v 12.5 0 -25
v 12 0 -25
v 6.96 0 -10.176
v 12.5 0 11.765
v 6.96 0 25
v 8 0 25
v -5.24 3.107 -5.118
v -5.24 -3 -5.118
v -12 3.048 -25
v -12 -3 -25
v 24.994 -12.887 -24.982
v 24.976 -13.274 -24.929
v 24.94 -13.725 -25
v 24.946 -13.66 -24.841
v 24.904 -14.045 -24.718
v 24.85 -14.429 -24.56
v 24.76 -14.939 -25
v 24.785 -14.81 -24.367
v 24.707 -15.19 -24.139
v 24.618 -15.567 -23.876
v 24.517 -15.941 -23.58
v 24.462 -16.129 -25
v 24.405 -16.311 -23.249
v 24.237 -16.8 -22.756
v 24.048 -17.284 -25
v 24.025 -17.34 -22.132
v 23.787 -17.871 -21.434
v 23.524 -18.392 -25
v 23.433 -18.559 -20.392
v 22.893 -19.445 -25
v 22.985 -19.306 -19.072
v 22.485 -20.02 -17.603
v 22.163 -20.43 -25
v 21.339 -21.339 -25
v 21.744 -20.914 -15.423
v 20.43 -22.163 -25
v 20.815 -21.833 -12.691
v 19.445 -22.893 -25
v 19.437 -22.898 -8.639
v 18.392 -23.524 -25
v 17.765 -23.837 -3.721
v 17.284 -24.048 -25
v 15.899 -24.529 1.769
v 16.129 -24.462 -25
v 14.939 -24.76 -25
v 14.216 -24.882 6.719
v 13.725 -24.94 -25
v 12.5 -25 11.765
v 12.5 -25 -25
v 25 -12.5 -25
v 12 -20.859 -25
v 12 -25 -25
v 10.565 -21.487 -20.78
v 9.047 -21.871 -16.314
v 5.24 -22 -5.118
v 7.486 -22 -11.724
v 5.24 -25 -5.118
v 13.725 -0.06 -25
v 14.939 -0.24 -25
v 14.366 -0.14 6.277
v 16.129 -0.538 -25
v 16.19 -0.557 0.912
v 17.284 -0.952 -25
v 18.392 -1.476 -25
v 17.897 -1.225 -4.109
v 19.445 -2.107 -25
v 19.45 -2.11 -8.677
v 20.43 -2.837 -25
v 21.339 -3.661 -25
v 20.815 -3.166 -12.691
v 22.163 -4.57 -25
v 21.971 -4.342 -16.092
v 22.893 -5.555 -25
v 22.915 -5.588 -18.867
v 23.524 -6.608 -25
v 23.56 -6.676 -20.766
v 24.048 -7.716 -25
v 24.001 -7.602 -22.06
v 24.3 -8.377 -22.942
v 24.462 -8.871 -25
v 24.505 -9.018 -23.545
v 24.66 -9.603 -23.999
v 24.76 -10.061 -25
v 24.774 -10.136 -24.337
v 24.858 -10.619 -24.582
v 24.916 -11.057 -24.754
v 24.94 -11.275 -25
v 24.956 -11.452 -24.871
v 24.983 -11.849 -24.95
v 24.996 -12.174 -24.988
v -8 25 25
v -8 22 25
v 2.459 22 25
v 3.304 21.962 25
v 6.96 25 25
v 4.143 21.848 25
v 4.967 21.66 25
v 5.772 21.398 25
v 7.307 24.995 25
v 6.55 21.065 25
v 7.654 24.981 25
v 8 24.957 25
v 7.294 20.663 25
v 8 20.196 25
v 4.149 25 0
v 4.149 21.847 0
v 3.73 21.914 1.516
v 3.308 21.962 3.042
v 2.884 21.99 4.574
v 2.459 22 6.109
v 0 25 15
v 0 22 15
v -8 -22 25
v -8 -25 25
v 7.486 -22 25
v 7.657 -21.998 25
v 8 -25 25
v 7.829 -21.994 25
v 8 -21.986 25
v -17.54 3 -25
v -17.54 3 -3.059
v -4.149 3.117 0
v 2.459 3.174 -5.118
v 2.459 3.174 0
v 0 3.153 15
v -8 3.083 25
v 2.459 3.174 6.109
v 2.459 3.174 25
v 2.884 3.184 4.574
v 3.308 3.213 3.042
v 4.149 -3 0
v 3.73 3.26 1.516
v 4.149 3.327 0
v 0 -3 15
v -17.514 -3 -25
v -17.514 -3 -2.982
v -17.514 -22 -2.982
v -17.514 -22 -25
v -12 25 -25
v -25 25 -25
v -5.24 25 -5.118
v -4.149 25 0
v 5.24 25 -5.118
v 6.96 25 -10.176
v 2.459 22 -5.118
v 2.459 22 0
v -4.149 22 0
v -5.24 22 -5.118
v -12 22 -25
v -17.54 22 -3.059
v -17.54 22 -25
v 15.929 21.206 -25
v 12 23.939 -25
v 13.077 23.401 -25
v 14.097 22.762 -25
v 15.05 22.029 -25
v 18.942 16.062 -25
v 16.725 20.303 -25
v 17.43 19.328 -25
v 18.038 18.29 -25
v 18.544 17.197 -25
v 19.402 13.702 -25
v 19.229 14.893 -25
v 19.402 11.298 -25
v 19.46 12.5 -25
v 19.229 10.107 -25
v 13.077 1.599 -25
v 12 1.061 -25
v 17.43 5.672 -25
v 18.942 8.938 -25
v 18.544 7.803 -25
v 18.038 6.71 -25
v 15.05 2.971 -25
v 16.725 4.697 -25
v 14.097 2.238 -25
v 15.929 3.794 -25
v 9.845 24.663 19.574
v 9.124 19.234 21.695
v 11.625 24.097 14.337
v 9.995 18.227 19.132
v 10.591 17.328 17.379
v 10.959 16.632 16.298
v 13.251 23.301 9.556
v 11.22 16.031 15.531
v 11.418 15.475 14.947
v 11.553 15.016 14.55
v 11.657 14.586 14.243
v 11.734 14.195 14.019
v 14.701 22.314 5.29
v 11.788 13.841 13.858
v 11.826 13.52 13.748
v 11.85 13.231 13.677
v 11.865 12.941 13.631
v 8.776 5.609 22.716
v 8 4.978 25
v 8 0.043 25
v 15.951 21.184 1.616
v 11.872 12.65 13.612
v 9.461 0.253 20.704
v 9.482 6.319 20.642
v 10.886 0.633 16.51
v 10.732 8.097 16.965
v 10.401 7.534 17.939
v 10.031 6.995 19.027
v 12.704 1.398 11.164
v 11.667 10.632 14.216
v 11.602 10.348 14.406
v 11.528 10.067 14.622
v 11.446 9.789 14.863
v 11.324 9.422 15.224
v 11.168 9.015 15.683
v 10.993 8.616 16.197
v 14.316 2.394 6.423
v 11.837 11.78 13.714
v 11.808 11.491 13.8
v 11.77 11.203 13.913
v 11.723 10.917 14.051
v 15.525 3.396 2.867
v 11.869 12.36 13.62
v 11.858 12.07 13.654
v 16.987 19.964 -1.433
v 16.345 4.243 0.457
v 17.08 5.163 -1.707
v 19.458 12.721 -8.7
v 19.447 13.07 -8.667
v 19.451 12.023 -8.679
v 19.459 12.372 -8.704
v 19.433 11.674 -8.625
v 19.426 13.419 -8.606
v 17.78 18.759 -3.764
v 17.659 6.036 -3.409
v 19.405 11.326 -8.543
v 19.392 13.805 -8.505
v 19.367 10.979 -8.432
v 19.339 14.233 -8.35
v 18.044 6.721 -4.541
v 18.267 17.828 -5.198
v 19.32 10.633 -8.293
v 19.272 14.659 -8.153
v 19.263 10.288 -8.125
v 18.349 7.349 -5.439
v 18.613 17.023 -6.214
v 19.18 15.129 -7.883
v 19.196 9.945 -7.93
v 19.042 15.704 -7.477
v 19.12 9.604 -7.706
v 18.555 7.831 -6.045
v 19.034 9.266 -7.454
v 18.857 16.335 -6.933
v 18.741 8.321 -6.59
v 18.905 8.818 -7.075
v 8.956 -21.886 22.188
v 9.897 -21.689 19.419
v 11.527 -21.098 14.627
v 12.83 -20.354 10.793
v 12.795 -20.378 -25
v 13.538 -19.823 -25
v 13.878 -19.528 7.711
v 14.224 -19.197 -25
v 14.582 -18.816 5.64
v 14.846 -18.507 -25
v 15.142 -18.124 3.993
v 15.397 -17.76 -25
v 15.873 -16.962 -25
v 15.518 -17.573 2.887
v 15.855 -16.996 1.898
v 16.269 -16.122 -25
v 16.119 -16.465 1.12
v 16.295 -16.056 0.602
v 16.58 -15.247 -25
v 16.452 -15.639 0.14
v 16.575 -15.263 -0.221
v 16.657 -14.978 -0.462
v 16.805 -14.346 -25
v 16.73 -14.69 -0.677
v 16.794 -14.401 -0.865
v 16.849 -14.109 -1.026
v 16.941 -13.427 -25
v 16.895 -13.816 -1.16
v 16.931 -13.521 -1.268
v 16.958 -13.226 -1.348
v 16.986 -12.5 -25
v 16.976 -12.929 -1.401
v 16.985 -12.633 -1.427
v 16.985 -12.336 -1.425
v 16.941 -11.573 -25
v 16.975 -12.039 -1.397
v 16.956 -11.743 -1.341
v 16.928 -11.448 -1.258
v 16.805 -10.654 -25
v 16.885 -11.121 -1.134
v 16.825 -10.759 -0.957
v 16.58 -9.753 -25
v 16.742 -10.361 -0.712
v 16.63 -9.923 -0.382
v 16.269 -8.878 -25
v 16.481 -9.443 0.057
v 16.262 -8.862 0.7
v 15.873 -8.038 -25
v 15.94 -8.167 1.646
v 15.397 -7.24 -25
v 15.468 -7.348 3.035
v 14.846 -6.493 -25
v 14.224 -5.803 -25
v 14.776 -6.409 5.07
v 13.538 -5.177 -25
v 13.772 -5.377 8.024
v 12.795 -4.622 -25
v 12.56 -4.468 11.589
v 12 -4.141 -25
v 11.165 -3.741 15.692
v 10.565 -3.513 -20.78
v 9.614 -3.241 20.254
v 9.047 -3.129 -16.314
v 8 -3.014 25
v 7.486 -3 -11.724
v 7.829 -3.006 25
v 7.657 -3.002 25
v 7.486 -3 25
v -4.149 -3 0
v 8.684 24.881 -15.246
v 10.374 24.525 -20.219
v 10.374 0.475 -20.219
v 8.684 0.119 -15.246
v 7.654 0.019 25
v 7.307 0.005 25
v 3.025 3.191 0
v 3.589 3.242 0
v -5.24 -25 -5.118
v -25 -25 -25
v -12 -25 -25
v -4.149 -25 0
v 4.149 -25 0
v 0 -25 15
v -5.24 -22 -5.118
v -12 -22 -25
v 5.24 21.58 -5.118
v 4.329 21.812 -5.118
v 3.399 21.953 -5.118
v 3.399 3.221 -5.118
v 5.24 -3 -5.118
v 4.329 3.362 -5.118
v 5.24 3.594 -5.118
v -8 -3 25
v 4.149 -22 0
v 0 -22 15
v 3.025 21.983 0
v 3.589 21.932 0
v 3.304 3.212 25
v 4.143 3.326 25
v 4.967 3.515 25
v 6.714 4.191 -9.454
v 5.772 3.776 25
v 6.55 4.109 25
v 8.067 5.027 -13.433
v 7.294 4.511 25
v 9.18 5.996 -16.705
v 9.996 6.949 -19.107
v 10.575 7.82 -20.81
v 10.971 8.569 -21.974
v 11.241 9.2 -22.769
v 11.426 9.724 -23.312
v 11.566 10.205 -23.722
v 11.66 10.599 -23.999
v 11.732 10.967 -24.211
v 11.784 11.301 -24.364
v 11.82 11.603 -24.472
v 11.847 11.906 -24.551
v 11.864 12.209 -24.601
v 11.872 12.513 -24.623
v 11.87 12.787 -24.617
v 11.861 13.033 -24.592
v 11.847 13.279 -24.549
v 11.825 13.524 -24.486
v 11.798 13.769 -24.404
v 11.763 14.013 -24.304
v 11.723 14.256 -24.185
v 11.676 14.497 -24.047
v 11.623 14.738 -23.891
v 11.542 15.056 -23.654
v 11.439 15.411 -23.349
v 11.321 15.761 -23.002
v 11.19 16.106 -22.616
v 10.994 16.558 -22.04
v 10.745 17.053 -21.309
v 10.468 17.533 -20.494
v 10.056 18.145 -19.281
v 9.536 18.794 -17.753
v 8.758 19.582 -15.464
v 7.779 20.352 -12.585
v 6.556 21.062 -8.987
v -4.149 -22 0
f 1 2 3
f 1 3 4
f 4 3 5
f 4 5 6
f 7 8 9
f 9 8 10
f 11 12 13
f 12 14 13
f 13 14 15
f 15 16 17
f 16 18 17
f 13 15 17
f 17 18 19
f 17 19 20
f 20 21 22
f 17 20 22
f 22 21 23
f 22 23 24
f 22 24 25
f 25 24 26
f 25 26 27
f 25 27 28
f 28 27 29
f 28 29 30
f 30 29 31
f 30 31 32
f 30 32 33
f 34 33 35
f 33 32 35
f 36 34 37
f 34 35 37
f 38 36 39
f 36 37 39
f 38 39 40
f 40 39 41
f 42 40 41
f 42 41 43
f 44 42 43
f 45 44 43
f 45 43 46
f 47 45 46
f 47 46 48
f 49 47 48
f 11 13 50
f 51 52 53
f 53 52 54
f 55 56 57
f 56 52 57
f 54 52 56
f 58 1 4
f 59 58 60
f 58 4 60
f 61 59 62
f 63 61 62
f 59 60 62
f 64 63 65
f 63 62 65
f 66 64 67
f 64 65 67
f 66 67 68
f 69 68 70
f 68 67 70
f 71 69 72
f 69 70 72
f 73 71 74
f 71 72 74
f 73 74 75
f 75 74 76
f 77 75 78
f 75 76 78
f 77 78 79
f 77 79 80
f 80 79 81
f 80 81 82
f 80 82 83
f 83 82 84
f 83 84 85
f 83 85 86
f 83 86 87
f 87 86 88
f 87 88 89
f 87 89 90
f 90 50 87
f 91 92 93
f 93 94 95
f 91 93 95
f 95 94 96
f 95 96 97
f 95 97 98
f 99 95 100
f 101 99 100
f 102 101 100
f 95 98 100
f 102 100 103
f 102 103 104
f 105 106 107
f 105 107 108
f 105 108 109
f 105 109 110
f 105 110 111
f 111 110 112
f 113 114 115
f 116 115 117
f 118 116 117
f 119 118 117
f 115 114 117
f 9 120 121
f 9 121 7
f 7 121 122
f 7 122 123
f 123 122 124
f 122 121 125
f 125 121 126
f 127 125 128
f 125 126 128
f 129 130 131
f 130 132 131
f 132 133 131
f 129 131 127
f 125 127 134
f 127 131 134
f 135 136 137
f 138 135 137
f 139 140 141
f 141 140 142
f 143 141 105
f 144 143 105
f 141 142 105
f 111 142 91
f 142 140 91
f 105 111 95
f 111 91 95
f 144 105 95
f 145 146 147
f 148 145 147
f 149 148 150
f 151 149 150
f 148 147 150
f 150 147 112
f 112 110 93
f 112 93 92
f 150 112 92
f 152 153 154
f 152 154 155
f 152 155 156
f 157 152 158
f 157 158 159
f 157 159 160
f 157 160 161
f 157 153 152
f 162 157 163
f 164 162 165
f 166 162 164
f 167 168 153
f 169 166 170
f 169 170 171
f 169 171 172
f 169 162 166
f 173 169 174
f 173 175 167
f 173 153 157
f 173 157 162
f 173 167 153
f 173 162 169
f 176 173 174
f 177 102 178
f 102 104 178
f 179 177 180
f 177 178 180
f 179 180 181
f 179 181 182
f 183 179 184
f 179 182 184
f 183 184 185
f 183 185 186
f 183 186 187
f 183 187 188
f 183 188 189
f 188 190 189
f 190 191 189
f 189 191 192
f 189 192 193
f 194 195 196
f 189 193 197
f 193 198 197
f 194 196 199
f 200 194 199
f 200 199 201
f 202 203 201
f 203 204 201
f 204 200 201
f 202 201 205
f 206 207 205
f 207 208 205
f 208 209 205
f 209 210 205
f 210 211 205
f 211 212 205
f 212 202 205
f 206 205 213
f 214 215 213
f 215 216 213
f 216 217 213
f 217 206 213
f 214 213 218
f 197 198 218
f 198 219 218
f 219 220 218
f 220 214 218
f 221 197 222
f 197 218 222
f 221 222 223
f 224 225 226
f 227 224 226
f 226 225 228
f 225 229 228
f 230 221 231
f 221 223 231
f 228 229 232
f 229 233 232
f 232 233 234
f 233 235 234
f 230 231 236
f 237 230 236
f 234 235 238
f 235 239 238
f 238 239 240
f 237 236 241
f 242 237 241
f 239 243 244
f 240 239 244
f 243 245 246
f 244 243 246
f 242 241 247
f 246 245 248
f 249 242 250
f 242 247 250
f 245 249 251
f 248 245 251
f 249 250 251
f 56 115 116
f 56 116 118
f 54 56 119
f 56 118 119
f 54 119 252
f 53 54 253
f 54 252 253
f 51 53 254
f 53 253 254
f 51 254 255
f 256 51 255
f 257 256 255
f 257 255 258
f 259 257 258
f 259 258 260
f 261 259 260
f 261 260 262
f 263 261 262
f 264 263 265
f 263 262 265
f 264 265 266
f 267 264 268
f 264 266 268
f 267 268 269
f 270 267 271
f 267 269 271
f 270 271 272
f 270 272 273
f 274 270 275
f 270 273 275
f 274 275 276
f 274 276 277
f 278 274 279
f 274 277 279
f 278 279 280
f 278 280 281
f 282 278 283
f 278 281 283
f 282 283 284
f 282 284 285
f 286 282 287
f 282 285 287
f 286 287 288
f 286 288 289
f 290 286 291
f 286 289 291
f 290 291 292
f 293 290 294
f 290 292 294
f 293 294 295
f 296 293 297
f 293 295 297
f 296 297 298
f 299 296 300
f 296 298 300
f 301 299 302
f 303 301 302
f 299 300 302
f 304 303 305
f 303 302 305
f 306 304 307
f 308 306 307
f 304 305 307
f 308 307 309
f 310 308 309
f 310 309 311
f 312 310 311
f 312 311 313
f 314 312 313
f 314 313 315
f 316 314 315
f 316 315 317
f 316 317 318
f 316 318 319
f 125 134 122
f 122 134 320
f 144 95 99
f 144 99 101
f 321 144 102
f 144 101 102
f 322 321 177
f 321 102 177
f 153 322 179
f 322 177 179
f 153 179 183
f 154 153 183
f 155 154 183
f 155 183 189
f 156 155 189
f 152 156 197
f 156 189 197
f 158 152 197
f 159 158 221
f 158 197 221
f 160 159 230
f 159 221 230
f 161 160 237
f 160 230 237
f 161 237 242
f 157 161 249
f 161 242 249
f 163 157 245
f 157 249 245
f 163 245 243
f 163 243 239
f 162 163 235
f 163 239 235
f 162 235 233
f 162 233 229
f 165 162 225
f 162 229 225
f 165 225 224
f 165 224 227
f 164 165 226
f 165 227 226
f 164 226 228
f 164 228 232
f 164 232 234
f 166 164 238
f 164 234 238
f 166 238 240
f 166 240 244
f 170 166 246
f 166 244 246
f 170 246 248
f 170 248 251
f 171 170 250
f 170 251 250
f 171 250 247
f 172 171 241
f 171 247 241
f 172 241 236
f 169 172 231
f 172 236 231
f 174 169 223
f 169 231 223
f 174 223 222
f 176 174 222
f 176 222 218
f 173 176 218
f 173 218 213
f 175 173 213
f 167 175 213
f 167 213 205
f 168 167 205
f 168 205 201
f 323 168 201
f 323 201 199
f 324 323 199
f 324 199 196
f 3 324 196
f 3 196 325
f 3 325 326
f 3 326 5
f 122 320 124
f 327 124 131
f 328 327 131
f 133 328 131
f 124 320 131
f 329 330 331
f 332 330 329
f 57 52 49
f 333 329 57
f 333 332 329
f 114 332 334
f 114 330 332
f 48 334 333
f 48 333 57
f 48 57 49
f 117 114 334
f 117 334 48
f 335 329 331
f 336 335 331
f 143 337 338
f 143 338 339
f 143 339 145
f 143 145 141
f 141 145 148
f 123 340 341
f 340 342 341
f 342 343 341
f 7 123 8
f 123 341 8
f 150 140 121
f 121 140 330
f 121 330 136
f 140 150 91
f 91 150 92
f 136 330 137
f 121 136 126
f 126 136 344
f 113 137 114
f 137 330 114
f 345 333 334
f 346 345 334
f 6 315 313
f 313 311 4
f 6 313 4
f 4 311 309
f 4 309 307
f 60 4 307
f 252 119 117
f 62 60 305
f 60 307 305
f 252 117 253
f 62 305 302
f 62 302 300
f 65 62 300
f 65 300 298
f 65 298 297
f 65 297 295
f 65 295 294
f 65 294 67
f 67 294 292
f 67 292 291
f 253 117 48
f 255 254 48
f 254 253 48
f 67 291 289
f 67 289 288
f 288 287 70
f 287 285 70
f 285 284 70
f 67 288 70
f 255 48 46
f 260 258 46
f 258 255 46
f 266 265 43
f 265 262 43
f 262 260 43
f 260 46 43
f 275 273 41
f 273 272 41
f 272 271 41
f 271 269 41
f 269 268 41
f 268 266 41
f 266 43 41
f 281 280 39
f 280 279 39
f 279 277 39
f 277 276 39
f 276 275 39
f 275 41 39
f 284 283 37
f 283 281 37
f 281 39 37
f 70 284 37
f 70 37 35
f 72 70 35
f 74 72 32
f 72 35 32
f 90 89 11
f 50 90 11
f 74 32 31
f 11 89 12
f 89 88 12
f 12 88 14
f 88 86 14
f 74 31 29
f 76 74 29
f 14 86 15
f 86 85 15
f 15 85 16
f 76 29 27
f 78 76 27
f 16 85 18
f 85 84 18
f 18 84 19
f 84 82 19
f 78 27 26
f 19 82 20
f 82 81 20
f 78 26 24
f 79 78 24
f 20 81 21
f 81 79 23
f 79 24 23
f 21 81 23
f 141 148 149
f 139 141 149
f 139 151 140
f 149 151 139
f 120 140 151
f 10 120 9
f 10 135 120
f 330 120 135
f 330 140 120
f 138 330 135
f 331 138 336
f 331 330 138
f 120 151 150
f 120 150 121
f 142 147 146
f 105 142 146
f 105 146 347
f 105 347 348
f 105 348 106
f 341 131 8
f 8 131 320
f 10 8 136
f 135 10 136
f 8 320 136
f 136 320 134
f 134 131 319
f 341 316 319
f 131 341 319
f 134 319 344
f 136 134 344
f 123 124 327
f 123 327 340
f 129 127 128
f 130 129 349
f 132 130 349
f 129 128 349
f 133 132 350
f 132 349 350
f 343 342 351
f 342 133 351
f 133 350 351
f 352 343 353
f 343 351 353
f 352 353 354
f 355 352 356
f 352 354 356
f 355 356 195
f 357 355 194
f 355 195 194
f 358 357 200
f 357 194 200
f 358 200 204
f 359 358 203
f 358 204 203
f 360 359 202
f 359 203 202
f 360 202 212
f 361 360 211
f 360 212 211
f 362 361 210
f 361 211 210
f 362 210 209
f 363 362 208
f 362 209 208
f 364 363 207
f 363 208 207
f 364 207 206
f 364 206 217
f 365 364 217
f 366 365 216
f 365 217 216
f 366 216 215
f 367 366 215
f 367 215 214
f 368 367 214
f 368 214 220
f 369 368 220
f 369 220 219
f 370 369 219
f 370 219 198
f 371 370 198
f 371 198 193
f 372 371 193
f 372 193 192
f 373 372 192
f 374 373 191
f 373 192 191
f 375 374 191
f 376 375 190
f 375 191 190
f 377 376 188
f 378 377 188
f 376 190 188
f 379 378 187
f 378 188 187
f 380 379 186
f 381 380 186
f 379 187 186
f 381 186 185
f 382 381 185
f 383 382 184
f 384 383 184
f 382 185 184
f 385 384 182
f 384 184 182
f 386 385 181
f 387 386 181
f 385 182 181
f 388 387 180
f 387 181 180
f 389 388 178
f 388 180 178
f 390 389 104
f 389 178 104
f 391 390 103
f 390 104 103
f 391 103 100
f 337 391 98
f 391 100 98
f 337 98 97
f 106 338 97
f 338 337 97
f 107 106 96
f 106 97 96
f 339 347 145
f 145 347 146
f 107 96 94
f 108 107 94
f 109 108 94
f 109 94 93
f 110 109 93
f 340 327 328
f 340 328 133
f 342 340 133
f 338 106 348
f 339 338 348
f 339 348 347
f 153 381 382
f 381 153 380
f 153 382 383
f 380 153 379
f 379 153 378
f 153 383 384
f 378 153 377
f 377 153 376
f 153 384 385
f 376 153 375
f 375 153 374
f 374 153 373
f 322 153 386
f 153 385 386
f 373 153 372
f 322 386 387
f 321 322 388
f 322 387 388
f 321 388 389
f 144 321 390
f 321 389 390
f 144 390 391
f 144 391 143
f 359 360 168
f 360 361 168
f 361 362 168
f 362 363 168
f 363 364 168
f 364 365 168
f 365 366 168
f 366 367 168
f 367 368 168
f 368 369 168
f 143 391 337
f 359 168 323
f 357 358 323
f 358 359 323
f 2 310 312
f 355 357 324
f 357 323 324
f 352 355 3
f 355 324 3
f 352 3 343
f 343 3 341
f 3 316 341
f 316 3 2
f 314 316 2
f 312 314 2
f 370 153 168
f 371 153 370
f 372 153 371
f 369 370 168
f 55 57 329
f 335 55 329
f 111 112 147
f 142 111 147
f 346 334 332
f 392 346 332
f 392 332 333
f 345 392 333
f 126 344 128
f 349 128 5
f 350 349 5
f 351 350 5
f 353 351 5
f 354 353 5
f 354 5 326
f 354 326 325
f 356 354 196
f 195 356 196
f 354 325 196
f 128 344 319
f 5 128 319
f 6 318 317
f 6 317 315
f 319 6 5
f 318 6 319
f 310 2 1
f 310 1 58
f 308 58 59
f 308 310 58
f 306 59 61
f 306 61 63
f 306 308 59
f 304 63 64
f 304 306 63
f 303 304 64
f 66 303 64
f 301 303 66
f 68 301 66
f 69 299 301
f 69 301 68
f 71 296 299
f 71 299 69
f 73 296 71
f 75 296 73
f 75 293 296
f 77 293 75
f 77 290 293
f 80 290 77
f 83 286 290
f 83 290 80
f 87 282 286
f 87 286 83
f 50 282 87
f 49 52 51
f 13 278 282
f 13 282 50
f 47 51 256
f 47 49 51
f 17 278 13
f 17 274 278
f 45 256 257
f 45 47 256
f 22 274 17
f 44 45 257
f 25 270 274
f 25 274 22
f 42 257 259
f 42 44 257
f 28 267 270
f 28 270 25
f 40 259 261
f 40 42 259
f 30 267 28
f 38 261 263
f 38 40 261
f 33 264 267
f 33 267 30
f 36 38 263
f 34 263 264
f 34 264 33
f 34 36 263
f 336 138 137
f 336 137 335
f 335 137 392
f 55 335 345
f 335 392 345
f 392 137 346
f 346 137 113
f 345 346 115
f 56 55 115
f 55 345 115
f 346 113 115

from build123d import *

# Parameters (mm, degrees)
F0_W     = 50
F0_H     = 50
F1_DEPTH = 25
F4_DEPTH = 50
F7_DEPTH = 50


with BuildPart() as f1:
    # F0 (on Front) → F1 (new body, symmetric)
    with BuildSketch(Plane.XZ):
        Rectangle(F0_W, F0_H)
    extrude(amount=F1_DEPTH, both=True)

    # F3 (on offset) → F4 (cut)
    with BuildSketch(Plane.XZ.offset(25)):
        Polygon((-8, 25), (-25, 25), (-25, -25), align=None)
        Polygon((4.149, 0), (0, 15), (-4.149486, 0), (0, 0), align=None)
        Polygon((8, 25), (25, -25), (25, 25), align=None)
        Polygon((-5.240043, -5.117772), (-12, -25), (12, -25), (5.240043, -5.117772), align=None)
    extrude(amount=-F4_DEPTH, mode=Mode.SUBTRACT)

    # F6 (on offset) → F7 (cut)
    with BuildSketch(Plane.XY.offset(25)):
        with BuildLine():
            Line((25, 25), (6.959901, 25))
            ThreePointArc((6.959901, 25), (19.459901, 12.5), (6.959901, 0))
            Line((6.959901, 0), (7.5, 0))
            Line((7.5, 0), (12.5, 0))
            ThreePointArc((12.5, 0), (21.338835, -3.661165), (25, -12.5))
            Line((25, -12.5), (25, 25))
        make_face()
        with BuildLine():
            ThreePointArc((25, -12.5), (21.338835, -21.338835), (12.5, -25))
            Line((12.5, -25), (25, -25))
            Line((25, -25), (25, -12.5))
        make_face()
        with BuildLine():
            Line((7.486049, -3), (-17.513951, -3))
            Line((-17.513951, -3), (-17.513951, -22))
            Line((-17.513951, -22), (7.486049, -22))
            ThreePointArc((7.486049, -22), (16.986049, -12.5), (7.486049, -3))
        make_face()
        with BuildLine():
            Line((2.459141, 21.999886), (-17.540099, 21.999886))
            Line((-17.540099, 21.999886), (-17.540099, 2.999886))
            Line((-17.540099, 2.999886), (2.459141, 3.174202))
            ThreePointArc((2.459141, 3.174202), (11.871983, 12.587044), (2.459141, 21.999886))
        make_face()
    extrude(amount=-F7_DEPTH, mode=Mode.SUBTRACT)


solid = f1.part
